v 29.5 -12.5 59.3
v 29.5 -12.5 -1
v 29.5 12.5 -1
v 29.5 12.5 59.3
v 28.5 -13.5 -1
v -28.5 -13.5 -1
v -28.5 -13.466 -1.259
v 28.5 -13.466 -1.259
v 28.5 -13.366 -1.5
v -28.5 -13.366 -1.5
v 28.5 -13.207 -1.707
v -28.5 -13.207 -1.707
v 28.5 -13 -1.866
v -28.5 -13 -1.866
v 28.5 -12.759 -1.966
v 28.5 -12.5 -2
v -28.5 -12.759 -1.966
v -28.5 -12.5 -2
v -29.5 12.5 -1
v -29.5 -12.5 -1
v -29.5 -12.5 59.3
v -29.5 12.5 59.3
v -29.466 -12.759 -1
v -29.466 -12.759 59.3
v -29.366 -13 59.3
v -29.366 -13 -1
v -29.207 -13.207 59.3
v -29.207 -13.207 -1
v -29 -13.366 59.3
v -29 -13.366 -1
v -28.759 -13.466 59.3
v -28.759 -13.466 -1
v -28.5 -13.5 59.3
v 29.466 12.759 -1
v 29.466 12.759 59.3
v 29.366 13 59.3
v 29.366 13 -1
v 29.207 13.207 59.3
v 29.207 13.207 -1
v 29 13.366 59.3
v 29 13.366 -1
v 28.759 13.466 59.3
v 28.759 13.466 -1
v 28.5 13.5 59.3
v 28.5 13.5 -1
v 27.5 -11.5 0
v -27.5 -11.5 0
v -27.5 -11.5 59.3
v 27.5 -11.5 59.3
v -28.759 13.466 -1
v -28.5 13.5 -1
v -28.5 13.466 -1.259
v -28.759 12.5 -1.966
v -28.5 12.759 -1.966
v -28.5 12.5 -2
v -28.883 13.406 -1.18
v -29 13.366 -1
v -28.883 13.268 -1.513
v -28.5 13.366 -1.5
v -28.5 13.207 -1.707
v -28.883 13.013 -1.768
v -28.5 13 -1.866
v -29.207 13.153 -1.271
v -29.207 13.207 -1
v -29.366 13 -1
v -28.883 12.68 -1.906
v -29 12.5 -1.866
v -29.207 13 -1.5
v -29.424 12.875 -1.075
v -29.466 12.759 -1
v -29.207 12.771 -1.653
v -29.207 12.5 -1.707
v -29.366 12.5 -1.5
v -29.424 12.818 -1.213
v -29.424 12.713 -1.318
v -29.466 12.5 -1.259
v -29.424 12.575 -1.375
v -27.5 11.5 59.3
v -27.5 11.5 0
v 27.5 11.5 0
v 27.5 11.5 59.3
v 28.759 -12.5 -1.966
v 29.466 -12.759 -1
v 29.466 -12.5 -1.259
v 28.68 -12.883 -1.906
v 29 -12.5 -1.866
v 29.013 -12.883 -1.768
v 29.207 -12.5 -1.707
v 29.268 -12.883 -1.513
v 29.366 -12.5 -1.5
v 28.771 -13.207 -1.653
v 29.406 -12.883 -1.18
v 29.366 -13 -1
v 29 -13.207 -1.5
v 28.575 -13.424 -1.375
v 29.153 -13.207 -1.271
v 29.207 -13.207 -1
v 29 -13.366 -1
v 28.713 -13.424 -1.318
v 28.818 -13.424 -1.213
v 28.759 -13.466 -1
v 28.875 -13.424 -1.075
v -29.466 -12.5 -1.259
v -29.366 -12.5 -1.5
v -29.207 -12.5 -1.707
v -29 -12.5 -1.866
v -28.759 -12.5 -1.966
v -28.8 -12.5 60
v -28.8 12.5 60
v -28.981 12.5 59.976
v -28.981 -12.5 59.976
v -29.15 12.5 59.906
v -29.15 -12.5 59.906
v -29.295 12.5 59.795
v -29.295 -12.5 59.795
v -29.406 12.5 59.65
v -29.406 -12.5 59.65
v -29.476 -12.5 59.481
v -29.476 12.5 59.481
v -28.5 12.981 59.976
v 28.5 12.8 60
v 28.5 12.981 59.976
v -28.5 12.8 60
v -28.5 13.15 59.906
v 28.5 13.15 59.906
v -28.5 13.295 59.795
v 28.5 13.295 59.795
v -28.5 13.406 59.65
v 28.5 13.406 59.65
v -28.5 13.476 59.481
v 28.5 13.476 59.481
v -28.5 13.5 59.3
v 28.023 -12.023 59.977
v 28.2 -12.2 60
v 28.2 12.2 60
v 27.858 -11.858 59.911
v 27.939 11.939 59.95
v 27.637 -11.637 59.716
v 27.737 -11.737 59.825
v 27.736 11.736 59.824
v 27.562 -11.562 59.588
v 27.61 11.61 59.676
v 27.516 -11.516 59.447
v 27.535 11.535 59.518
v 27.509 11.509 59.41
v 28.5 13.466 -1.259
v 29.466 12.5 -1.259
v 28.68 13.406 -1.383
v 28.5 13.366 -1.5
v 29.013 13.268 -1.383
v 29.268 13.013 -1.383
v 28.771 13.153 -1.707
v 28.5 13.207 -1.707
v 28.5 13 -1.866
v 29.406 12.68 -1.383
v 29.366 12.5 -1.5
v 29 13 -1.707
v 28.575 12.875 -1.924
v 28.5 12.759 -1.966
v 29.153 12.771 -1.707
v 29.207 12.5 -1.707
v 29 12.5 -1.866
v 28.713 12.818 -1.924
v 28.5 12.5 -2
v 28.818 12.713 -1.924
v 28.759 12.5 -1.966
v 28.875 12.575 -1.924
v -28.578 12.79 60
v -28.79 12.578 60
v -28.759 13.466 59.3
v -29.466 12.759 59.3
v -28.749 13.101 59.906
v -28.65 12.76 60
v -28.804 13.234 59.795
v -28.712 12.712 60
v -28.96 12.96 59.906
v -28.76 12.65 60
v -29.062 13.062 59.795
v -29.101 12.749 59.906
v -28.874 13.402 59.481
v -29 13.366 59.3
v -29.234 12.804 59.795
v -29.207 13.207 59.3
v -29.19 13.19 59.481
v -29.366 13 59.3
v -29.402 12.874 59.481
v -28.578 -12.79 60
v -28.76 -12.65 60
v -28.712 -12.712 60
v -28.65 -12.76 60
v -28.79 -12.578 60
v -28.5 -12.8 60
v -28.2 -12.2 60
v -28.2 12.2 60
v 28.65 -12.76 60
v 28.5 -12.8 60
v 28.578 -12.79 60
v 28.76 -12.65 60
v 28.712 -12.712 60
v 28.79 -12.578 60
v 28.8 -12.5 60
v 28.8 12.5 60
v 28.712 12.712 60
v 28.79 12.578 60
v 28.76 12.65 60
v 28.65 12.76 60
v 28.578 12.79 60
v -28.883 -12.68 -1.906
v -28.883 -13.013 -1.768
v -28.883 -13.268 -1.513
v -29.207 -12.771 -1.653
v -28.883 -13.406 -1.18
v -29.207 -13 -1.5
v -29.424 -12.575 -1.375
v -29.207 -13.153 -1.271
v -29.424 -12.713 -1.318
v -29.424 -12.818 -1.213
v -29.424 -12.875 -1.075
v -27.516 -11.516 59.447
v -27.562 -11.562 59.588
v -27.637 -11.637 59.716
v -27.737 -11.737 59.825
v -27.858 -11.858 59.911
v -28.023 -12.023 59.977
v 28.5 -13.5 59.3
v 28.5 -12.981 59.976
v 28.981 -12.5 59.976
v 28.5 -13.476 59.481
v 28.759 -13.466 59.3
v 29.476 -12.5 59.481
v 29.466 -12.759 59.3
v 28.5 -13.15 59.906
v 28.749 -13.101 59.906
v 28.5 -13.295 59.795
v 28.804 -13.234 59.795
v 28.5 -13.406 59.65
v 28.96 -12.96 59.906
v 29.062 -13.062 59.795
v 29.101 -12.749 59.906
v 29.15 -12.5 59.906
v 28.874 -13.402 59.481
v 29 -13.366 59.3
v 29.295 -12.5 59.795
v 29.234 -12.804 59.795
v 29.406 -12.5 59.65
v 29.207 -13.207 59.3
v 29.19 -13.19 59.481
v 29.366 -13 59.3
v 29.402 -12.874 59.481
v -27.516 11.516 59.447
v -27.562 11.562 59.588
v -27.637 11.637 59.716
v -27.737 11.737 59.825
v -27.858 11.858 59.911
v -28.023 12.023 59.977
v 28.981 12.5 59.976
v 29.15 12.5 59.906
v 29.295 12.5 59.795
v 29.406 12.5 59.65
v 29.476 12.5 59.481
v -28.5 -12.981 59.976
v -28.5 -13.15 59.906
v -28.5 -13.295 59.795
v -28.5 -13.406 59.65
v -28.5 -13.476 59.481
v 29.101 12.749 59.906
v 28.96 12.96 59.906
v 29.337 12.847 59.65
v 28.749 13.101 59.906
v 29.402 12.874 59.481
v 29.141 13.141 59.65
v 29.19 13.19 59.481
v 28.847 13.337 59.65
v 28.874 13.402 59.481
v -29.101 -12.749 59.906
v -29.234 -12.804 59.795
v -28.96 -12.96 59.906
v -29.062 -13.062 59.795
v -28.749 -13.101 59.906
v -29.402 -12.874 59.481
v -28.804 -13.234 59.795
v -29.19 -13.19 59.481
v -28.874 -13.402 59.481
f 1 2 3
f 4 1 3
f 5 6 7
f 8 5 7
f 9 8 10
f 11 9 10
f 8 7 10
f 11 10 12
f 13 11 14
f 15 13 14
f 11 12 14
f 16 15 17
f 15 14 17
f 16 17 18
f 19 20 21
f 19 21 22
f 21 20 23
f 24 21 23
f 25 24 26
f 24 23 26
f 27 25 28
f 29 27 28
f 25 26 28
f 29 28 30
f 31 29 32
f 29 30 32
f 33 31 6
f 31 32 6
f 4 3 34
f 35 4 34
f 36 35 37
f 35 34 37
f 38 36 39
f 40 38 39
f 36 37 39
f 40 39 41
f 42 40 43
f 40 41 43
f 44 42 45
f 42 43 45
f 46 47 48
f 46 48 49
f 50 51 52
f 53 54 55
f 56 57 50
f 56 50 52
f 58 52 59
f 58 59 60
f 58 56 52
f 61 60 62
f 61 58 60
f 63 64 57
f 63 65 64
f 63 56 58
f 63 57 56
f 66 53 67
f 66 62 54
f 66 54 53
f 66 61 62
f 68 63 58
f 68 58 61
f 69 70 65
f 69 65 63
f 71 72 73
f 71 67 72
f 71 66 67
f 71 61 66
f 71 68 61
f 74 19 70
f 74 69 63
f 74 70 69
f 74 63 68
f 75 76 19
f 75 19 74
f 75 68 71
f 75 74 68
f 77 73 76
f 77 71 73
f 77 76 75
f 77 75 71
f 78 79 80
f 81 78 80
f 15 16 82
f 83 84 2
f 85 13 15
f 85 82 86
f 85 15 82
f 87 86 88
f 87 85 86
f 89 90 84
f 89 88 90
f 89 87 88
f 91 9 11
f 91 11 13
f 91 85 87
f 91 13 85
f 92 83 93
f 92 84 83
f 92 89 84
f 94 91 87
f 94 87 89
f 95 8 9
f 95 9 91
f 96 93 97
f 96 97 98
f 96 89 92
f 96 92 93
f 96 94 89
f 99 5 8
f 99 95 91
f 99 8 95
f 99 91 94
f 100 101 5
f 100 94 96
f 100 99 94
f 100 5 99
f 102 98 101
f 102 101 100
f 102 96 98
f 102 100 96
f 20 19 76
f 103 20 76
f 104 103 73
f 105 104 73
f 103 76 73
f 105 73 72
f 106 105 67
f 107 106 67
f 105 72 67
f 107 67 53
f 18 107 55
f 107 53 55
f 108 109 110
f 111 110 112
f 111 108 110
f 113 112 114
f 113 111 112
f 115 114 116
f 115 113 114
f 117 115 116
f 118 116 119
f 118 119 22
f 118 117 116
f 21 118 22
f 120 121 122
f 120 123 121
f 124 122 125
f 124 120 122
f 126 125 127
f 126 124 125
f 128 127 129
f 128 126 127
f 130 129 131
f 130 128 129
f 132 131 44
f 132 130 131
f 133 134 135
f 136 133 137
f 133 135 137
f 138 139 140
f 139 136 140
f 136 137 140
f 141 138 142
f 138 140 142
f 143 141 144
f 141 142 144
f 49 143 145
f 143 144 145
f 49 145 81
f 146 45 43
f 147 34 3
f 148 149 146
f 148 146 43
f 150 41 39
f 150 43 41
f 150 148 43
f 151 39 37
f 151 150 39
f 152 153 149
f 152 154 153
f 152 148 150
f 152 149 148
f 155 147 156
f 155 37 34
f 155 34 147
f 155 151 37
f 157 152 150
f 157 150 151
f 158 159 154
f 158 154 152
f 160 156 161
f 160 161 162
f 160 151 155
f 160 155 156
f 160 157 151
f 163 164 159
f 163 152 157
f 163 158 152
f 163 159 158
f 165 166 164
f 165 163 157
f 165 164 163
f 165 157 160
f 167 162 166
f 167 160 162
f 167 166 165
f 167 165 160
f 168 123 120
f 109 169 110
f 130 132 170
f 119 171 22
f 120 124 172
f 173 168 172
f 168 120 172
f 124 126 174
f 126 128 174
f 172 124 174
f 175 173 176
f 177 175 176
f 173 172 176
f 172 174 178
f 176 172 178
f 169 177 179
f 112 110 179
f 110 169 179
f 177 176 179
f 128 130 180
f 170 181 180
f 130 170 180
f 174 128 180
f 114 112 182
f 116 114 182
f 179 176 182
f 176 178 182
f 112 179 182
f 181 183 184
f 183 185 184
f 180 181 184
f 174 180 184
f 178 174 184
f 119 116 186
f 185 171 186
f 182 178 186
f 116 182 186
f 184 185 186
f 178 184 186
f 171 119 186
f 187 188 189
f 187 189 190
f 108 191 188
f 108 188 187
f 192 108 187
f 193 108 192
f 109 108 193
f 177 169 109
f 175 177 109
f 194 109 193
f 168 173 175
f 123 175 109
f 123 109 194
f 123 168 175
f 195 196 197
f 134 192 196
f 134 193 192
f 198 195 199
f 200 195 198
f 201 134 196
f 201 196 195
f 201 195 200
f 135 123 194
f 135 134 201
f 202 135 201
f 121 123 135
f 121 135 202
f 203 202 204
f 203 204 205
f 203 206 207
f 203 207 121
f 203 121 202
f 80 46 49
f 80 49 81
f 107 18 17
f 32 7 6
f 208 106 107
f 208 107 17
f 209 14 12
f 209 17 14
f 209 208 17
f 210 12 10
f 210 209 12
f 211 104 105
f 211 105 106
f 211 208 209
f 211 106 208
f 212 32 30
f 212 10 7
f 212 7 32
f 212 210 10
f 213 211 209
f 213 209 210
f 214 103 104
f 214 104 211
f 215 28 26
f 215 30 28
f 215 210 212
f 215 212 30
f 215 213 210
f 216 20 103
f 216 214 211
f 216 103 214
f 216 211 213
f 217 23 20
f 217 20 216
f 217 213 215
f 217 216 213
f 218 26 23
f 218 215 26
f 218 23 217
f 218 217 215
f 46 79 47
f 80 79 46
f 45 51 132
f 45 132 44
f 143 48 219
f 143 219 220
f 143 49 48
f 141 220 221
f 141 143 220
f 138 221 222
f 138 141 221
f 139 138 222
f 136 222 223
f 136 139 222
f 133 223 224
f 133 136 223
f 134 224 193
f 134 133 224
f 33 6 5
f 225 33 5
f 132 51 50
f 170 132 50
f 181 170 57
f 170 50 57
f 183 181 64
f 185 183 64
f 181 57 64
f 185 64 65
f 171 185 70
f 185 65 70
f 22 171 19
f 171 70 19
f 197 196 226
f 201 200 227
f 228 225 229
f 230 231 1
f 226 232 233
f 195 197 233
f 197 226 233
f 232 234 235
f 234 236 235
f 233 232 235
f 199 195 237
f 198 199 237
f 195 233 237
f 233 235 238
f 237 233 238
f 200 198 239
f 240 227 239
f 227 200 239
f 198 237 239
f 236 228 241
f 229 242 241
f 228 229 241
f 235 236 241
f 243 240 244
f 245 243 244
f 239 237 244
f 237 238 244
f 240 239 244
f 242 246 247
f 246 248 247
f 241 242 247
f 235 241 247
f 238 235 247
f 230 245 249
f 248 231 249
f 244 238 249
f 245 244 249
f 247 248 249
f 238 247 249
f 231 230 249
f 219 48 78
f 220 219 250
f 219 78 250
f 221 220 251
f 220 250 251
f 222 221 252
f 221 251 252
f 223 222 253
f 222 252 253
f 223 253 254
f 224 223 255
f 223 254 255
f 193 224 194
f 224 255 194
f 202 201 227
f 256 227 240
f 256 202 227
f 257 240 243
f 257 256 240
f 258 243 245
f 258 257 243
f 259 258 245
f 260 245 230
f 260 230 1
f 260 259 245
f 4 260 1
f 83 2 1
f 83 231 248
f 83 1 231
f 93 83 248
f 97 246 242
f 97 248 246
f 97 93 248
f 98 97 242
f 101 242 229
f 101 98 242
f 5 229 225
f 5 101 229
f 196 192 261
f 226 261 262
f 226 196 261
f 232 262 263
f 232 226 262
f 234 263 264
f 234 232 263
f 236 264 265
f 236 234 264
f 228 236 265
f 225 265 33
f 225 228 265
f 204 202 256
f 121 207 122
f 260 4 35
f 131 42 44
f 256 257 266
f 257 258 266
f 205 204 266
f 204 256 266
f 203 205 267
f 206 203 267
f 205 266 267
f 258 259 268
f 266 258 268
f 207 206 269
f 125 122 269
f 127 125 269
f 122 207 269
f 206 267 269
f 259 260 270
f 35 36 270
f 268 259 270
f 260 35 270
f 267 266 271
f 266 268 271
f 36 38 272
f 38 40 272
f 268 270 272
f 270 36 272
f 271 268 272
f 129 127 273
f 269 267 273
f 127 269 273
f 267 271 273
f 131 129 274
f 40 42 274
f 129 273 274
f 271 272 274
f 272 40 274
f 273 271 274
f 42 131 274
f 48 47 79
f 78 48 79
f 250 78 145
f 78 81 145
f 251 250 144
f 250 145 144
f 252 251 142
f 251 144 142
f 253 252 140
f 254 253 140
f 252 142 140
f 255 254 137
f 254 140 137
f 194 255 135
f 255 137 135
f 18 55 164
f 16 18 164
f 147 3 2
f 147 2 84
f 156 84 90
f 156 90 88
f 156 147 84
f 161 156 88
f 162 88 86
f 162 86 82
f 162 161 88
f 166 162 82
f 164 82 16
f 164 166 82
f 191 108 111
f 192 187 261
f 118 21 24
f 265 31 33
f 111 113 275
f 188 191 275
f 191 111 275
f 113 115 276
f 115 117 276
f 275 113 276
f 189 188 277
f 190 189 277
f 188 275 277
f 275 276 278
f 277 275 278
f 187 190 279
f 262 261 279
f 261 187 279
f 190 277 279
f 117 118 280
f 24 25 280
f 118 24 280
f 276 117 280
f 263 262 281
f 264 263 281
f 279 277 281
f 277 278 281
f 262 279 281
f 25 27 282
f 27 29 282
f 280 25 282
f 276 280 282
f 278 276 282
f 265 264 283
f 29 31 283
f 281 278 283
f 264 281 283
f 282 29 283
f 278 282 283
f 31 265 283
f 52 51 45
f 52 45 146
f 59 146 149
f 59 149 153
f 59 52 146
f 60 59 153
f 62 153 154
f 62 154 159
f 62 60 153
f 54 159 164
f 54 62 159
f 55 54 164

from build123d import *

# Parameters (mm, degrees)
F0_W         = 55
F0_H         = 23
F1_DEPTH     = 60
F2_T         = 2
F3_T1_DEPTH  = 63.5
F3_T3_DEPTH  = 25
F3_T5_DEPTH  = 57
F3_S9_W      = 1
F3_S9_H      = 1
F3_T10_DEPTH = 1
F3_S15_W     = 1
F3_S15_H     = 1
F3_T16_DEPTH = 1
F3_S21_W     = 1
F3_S21_H     = 1
F3_T22_DEPTH = 1
F3_S27_W     = 1
F3_S27_H     = 1
F3_T28_DEPTH = 1
F4_R         = 0.7


# Not quite as in the source:
# - a fillet or chamfer that OpenCascade refuses, or shapes differently, is made with other operations: its cross-section is extruded or revolved along the edge and cut away or added


with BuildPart() as f1:
    # F0 (on Top) → F1 (new body)
    with BuildSketch(Plane.XY):
        Rectangle(F0_W, F0_H)
    extrude(amount=F1_DEPTH)

    # F2
    f2_openings = [f1.faces().sort_by_distance(p)[0] for p in [
        (0, 0, 60),
    ]]
    offset(amount=F2_T, openings=f2_openings, kind=Kind.INTERSECTION)

    # F3: fillet of radius 1 on 8 edges, made by hand

    # F3_s2 → F3_t1 (cut)
    with BuildSketch(Plane.XY.offset(-1)):
        with BuildLine():
            ThreePointArc((29.5, -12.5), (29.2071067812, -13.2071067812), (28.5, -13.5))
            Line((28.5, -13.5), (29.5, -13.5))
            Line((29.5, -13.5), (29.5, -12.5))
        make_face()
        with BuildLine():
            ThreePointArc((29.5, 12.5), (29.2071067812, 13.2071067812), (28.5, 13.5))
            Line((28.5, 13.5), (29.5, 13.5))
            Line((29.5, 13.5), (29.5, 12.5))
        make_face()
        with BuildLine():
            ThreePointArc((-28.5, 13.5), (-29.2071067812, 13.2071067812), (-29.5, 12.5))
            Line((-29.5, 12.5), (-29.5, 13.5))
            Line((-29.5, 13.5), (-28.5, 13.5))
        make_face()
        with BuildLine():
            ThreePointArc((-29.5, -12.5), (-29.2071067812, -13.2071067812), (-28.5, -13.5))
            Line((-28.5, -13.5), (-29.5, -13.5))
            Line((-29.5, -13.5), (-29.5, -12.5))
        make_face()
    extrude(amount=F3_T1_DEPTH, mode=Mode.SUBTRACT)

    # F3_s4 → F3_t3 (cut)
    with BuildSketch(Plane.XZ.offset(-12.5)):
        with BuildLine():
            ThreePointArc((29.5, -1), (29.2071067812, -1.7071067812), (28.5, -2))
            Line((28.5, -2), (29.5, -2))
            Line((29.5, -2), (29.5, -1))
        make_face()
        with BuildLine():
            ThreePointArc((-29.5, -1), (-29.2071067812, -1.7071067812), (-28.5, -2))
            Line((-28.5, -2), (-29.5, -2))
            Line((-29.5, -2), (-29.5, -1))
        make_face()
    extrude(amount=F3_T3_DEPTH, mode=Mode.SUBTRACT)

    # F3_s6 → F3_t5 (cut)
    with BuildSketch(Plane.YZ.offset(-28.5)):
        with BuildLine():
            ThreePointArc((13.5, -1), (13.2071067812, -1.7071067812), (12.5, -2))
            Line((12.5, -2), (13.5, -2))
            Line((13.5, -2), (13.5, -1))
        make_face()
        with BuildLine():
            ThreePointArc((-13.5, -1), (-13.2071067812, -1.7071067812), (-12.5, -2))
            Line((-12.5, -2), (-13.5, -2))
            Line((-13.5, -2), (-13.5, -1))
        make_face()
    extrude(amount=F3_T5_DEPTH, mode=Mode.SUBTRACT)


with BuildPart() as f3_tool8:
    # F3_s9 → F3_t10 (new body)
    with BuildSketch(Plane.XZ.offset(12.5)):
        with Locations((29, -1.5)):
            Rectangle(F3_S9_W, F3_S9_H)
    extrude(amount=F3_T10_DEPTH)

    # F3_s11 → F3_t12 (revolve, cut)
    with BuildSketch(Plane(origin=(28.5, -12.5, -1), x_dir=(-0.7071067812, 0, 0.7071067812), z_dir=(0.7071067812, 0, 0.7071067812))):
        with BuildLine():
            ThreePointArc((0, -1), (1, 0), (0, 1))
            Line((0, 1), (0, -1))
        make_face()
    revolve(axis=Axis((28.5, -12.5, -1), (0, -1, 0)), mode=Mode.SUBTRACT)


with BuildPart() as f1_1:
    add(f1.part)

    # F3_t7: cut F3_tool8
    add(f3_tool8.part, mode=Mode.SUBTRACT)


with BuildPart() as f3_tool14:
    # F3_s15 → F3_t16 (new body)
    with BuildSketch(Plane.XY.offset(-1)):
        with Locations((29, 13)):
            Rectangle(F3_S15_W, F3_S15_H)
    extrude(amount=-F3_T16_DEPTH)

    # F3_s17 → F3_t18 (revolve, cut)
    with BuildSketch(Plane(origin=(28.5, 12.5, -1), x_dir=(-0.7071067812, -0.7071067812, 0), z_dir=(0.7071067812, -0.7071067812, 0))):
        with BuildLine():
            ThreePointArc((0, -1), (1, 0), (0, 1))
            Line((0, 1), (0, -1))
        make_face()
    revolve(axis=Axis((28.5, 12.5, -1), (0, 0, -1)), mode=Mode.SUBTRACT)


with BuildPart() as f1_2:
    add(f1_1.part)

    # F3_t13: cut F3_tool14
    add(f3_tool14.part, mode=Mode.SUBTRACT)


with BuildPart() as f3_tool20:
    # F3_s21 → F3_t22 (new body)
    with BuildSketch(Plane.YZ.offset(-28.5)):
        with Locations((13, -1.5)):
            Rectangle(F3_S21_W, F3_S21_H)
    extrude(amount=-F3_T22_DEPTH)

    # F3_s23 → F3_t24 (revolve, cut)
    with BuildSketch(Plane(origin=(-28.5, 12.5, -1), x_dir=(0, -0.7071067812, 0.7071067812), z_dir=(0, -0.7071067812, -0.7071067812))):
        with BuildLine():
            ThreePointArc((0, -1), (1, 0), (0, 1))
            Line((0, 1), (0, -1))
        make_face()
    revolve(axis=Axis((-28.5, 12.5, -1), (-1, 0, 0)), mode=Mode.SUBTRACT)


with BuildPart() as f1_3:
    add(f1_2.part)

    # F3_t19: cut F3_tool20
    add(f3_tool20.part, mode=Mode.SUBTRACT)


with BuildPart() as f3_tool26:
    # F3_s27 → F3_t28 (new body)
    with BuildSketch(Plane.YZ.offset(-28.5)):
        with Locations((-13, -1.5)):
            Rectangle(F3_S27_W, F3_S27_H)
    extrude(amount=-F3_T28_DEPTH)

    # F3_s29 → F3_t30 (revolve, cut)
    with BuildSketch(Plane(origin=(-28.5, -12.5, -1), x_dir=(0, 0.7071067812, 0.7071067812), z_dir=(0, -0.7071067812, 0.7071067812))):
        with BuildLine():
            ThreePointArc((0, -1), (1, 0), (0, 1))
            Line((0, 1), (0, -1))
        make_face()
    revolve(axis=Axis((-28.5, -12.5, -1), (-1, 0, 0)), mode=Mode.SUBTRACT)


with BuildPart() as f1_4:
    add(f1_3.part)

    # F3_t25: cut F3_tool26
    add(f3_tool26.part, mode=Mode.SUBTRACT)

    # F4
    f4_edges = [f1_4.edges().sort_by_distance(p)[0] for p in [
        (0, -11.5, 60),
        (27.5, 0, 60),
        (0, 11.5, 60),
        (-27.5, 0, 60),
        (0, 13.5, 60),
        (0, -13.5, 60),
        (-29.5, 0, 60),
        (29.5, 0, 60),
        (-29.207107, 13.207107, 60),
        (29.207107, 13.207107, 60),
        (29.207107, -13.207107, 60),
        (-29.207107, -13.207107, 60),
    ]]
    fillet(f4_edges, radius=F4_R)


solid = f1_4.part
